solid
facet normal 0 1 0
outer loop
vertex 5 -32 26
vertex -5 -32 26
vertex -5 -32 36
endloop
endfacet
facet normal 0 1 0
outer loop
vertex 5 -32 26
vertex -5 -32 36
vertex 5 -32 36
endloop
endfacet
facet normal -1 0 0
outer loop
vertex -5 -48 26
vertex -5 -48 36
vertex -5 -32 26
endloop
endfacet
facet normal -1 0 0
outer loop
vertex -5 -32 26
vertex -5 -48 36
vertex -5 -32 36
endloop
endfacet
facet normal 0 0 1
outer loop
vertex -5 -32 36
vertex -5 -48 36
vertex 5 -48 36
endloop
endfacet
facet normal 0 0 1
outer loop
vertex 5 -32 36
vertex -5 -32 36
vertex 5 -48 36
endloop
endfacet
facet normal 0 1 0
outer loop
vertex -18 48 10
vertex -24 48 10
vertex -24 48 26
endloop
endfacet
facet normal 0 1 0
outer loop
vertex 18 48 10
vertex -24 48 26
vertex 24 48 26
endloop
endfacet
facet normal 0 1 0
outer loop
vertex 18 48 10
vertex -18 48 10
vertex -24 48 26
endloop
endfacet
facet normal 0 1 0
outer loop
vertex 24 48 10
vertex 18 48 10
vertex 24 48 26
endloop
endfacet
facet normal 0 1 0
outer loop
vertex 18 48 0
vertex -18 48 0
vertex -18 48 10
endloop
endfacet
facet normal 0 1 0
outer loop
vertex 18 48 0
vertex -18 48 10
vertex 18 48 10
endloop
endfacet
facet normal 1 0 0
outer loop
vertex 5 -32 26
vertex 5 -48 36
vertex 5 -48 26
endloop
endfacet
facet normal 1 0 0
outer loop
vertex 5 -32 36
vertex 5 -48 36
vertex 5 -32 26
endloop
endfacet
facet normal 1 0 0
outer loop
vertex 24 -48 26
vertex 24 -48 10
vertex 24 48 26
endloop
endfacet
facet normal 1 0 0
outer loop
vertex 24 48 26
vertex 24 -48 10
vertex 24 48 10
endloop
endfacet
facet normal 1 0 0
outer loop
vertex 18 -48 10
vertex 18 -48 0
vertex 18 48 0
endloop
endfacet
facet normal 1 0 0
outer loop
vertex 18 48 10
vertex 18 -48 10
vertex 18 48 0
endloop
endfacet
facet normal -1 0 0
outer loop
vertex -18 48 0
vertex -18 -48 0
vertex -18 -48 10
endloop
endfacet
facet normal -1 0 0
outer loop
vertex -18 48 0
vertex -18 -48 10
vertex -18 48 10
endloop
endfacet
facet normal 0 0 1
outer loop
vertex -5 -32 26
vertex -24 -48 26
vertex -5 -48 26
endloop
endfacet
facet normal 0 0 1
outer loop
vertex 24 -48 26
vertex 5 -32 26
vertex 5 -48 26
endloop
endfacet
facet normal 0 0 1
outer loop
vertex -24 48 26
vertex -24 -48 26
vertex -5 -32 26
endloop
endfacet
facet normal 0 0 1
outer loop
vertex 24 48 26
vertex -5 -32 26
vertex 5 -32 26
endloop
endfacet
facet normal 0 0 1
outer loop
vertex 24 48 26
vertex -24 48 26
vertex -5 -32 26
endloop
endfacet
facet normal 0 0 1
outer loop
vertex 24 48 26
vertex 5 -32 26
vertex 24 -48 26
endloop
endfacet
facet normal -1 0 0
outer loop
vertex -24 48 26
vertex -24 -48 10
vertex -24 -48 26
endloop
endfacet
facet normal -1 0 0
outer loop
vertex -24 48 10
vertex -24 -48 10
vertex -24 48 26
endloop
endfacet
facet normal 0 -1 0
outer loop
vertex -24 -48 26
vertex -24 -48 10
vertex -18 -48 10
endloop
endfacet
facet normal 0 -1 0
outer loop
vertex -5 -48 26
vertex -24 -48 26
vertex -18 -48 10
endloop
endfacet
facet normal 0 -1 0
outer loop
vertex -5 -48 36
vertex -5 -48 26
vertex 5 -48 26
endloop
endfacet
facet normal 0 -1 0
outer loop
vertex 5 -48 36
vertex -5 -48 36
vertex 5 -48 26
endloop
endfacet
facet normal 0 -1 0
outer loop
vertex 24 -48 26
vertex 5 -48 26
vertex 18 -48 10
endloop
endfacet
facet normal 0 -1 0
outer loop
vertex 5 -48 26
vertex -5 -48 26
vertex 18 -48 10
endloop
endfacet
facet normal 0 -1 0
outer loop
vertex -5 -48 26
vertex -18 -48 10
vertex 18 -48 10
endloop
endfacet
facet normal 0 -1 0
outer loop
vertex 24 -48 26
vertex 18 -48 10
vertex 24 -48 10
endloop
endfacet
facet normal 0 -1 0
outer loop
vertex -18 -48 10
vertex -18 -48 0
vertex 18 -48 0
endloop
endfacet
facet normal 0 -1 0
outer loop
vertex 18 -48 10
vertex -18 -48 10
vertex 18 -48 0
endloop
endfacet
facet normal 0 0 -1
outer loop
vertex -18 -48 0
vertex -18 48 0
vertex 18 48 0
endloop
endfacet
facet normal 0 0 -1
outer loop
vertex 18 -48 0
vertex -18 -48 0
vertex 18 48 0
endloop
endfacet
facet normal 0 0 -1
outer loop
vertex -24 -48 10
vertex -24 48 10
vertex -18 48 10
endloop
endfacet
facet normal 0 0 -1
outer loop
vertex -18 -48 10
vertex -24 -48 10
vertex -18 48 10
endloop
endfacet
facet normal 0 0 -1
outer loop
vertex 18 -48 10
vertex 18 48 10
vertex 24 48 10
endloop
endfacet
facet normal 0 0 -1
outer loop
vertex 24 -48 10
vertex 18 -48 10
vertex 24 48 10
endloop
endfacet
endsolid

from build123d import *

# Parameters (mm, degrees)
F0_W     = 36
F0_H     = 96
F1_DEPTH = 10
F2_W     = 48
F2_H     = 96
F3_DEPTH = 16
F4_W     = 48
F4_H     = 16
F5_DEPTH = 10
F6_W     = 19
F6_H     = 16
F7_DEPTH = 10


with BuildPart() as f1:
    # F0 (on Top) → F1 (new body)
    with BuildSketch(Plane.XY):
        Rectangle(F0_W, F0_H)
    extrude(amount=F1_DEPTH)

    # F2 (on face) → F3 (join)
    with BuildSketch(Plane.XY.offset(10)):
        Rectangle(F2_W, F2_H)
    extrude(amount=F3_DEPTH)

    # F4 (on face) → F5 (join)
    with BuildSketch(Plane.XY.offset(26)):
        with Locations((0, -40)):
            Rectangle(F4_W, F4_H)
    extrude(amount=F5_DEPTH)

    # F6 (on face) → F7 (cut)
    with BuildSketch(Plane.XY.offset(36)):
        with Locations((-14.5, -40)):
            Rectangle(F6_W, F6_H)
        with Locations((14.5, -40)):
            Rectangle(F6_W, F6_H)
    extrude(amount=-F7_DEPTH, mode=Mode.SUBTRACT)


solid = f1.part
